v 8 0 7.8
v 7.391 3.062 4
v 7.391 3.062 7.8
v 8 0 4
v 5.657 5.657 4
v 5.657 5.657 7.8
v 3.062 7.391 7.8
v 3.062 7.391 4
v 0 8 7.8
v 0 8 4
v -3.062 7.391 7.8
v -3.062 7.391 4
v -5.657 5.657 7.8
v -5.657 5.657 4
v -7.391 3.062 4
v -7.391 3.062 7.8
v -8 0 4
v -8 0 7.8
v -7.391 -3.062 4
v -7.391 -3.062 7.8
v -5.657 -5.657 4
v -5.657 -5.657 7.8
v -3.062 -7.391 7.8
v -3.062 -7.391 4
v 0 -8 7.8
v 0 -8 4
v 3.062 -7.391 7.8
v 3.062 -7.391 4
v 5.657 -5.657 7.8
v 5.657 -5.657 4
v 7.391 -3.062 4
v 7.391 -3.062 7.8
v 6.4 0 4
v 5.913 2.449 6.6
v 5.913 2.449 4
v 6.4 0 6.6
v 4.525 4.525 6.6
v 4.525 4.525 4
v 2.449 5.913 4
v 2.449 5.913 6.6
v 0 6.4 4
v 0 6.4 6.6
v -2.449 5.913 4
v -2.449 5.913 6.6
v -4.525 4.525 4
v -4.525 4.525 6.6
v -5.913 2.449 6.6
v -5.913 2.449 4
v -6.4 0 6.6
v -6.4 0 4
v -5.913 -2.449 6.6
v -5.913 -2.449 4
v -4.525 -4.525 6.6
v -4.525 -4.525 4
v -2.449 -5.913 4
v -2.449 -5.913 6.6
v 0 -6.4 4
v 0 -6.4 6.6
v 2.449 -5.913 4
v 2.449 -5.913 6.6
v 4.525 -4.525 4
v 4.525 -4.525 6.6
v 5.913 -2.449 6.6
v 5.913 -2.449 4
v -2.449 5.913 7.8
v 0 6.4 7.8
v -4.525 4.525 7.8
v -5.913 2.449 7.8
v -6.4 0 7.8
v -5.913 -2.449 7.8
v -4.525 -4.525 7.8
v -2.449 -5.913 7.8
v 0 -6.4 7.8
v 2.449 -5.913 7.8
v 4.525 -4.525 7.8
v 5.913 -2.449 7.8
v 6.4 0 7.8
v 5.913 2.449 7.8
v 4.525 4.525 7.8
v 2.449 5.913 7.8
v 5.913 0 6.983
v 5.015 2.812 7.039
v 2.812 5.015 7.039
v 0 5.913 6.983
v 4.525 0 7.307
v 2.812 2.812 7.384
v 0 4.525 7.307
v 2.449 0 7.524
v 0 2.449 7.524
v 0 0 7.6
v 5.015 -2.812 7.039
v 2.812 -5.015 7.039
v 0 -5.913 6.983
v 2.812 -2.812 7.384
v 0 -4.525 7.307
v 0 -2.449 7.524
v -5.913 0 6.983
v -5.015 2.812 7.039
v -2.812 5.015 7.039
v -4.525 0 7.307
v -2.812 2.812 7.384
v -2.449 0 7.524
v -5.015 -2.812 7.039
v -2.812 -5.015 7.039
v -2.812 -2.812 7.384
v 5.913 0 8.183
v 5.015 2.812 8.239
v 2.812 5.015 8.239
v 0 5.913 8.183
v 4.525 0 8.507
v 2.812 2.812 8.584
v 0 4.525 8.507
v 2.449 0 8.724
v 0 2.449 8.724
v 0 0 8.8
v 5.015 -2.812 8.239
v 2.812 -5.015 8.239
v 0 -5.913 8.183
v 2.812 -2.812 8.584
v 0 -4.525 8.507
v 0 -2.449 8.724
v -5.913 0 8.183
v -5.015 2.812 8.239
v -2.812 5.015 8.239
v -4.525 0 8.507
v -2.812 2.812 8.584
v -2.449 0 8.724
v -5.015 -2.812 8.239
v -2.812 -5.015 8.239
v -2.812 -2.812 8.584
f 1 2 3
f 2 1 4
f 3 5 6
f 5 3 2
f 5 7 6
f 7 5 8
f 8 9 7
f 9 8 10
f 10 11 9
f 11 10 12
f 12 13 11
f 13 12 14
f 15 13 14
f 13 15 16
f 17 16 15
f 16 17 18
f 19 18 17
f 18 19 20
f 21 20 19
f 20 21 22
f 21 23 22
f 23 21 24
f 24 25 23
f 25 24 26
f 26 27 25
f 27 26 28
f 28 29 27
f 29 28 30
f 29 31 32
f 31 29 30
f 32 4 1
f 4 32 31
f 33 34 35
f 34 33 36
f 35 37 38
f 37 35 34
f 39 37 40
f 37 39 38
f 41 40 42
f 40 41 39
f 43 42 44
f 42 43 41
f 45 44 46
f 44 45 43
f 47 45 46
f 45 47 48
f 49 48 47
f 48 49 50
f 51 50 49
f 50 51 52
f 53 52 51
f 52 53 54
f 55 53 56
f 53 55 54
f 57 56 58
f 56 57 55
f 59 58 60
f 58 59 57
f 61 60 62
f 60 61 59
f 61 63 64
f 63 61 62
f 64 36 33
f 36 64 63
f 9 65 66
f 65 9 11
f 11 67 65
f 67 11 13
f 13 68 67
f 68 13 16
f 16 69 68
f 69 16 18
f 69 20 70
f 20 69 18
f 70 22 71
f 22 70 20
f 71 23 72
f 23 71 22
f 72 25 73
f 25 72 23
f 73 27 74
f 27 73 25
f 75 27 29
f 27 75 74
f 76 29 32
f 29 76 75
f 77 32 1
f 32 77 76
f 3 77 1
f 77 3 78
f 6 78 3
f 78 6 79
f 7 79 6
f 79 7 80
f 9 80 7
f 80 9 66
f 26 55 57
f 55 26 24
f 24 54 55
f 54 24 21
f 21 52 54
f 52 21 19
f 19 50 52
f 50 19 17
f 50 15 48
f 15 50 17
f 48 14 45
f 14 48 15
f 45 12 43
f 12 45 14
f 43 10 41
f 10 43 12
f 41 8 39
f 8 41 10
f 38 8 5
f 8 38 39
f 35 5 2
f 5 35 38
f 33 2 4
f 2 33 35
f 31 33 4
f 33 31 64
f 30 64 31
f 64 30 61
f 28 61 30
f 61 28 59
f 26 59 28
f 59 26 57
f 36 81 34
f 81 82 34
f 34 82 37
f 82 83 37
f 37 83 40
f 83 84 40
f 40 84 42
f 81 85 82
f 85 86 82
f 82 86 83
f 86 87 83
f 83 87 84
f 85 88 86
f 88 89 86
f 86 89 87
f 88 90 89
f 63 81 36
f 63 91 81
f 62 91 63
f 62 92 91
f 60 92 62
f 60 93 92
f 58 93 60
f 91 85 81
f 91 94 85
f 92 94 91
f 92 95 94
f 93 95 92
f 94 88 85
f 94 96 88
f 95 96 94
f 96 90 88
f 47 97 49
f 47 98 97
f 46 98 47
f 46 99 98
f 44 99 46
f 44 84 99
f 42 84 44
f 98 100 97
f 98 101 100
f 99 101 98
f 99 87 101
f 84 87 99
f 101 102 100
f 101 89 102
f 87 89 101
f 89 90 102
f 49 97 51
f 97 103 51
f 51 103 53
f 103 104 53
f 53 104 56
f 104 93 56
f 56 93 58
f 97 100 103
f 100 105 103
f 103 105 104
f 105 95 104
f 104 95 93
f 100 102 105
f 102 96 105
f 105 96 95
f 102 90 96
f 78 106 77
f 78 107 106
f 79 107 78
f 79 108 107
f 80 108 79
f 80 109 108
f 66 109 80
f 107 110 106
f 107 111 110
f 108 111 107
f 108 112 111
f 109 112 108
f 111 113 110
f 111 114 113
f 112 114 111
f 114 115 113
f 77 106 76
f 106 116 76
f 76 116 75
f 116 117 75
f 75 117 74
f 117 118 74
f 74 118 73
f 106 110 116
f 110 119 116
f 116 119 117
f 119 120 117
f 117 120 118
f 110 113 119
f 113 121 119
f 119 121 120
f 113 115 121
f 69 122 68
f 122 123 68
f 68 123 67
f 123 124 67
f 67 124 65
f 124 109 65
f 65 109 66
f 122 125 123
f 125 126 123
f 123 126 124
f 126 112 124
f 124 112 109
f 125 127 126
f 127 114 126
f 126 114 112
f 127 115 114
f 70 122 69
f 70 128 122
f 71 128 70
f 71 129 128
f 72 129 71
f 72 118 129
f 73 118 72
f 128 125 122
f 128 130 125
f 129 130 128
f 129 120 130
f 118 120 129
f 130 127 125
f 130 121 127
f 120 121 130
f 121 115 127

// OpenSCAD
// file: ../p/1-8sphe.scad
use <../lib.scad>
function ldraw_lib__1_8sphe() = [
// 0 Sphere 0.125
// 0 Name: 1-8sphe.dat
// 0 Author: James Jessiman
// 0 !LDRAW_ORG Primitive UPDATE 2012-03
// 0 !LICENSE Licensed under CC BY 2.0 and CC BY 4.0 : see CAreadme.txt
// 
// 0 BFC CERTIFY CCW
  [0,"BFC","CERTIFY"],
  [0,"BFC","CCW"],
// 
// 0 !HISTORY 2000-08-01 {Axel Poque} fixes to resolve L3P error messages.
// 0 !HISTORY 2000-08-01 {Manfred Moolhuysen} fixes to resolve L3P error messages.
// 0 !HISTORY 2000-09-30 [PTadmin] Official Update 2000-02
// 0 !HISTORY 2002-03-28 [hafhead] Made BFC compliant
// 0 !HISTORY 2002-04-25 [PTadmin] Official Update 2002-02
// 0 !HISTORY 2007-06-22 [PTadmin] Header formatted for Contributor Agreement
// 0 !HISTORY 2008-07-01 [PTadmin] Official Update 2008-01
// 0 !HISTORY 2010-09-12 [MagFors] Changed winding, removed duplicated cond-line, optimized filesize
// 0 !HISTORY 2010-12-31 [PTadmin] Official Update 2010-03
// 0 !HISTORY 2012-07-01 [tcobbs] Replaced with geometry from LDView
// 0 !HISTORY 2012-12-28 [PTadmin] Official Update 2012-03
// 
// 
// 3 16 1 0 0 0.9239 0.3827 0 0.9239 0 0.3827
  [3,16,1,0,0,0.9239,0.3827,0,0.9239,0,0.3827],
// 3 16 0.9239 0.3827 0 0.7836 0.4393 0.4393 0.9239 0 0.3827
  [3,16,0.9239,0.3827,0,0.7836,0.4393,0.4393,0.9239,0,0.3827],
// 3 16 0.9239 0 0.3827 0.7836 0.4393 0.4393 0.7071 0 0.7071
  [3,16,0.9239,0,0.3827,0.7836,0.4393,0.4393,0.7071,0,0.7071],
// 3 16 0.7836 0.4393 0.4393 0.4393 0.4393 0.7836 0.7071 0 0.7071
  [3,16,0.7836,0.4393,0.4393,0.4393,0.4393,0.7836,0.7071,0,0.7071],
// 3 16 0.7071 0 0.7071 0.4393 0.4393 0.7836 0.3827 0 0.9239
  [3,16,0.7071,0,0.7071,0.4393,0.4393,0.7836,0.3827,0,0.9239],
// 3 16 0.4393 0.4393 0.7836 0 0.3827 0.9239 0.3827 0 0.9239
  [3,16,0.4393,0.4393,0.7836,0,0.3827,0.9239,0.3827,0,0.9239],
// 3 16 0.3827 0 0.9239 0 0.3827 0.9239 0 0 1
  [3,16,0.3827,0,0.9239,0,0.3827,0.9239,0,0,1],
// 3 16 0.9239 0.3827 0 0.7071 0.7071 0 0.7836 0.4393 0.4393
  [3,16,0.9239,0.3827,0,0.7071,0.7071,0,0.7836,0.4393,0.4393],
// 3 16 0.7071 0.7071 0 0.4393 0.7836 0.4393 0.7836 0.4393 0.4393
  [3,16,0.7071,0.7071,0,0.4393,0.7836,0.4393,0.7836,0.4393,0.4393],
// 3 16 0.7836 0.4393 0.4393 0.4393 0.7836 0.4393 0.4393 0.4393 0.7836
  [3,16,0.7836,0.4393,0.4393,0.4393,0.7836,0.4393,0.4393,0.4393,0.7836],
// 3 16 0.4393 0.7836 0.4393 0 0.7071 0.7071 0.4393 0.4393 0.7836
  [3,16,0.4393,0.7836,0.4393,0,0.7071,0.7071,0.4393,0.4393,0.7836],
// 3 16 0.4393 0.4393 0.7836 0 0.7071 0.7071 0 0.3827 0.9239
  [3,16,0.4393,0.4393,0.7836,0,0.7071,0.7071,0,0.3827,0.9239],
// 3 16 0.7071 0.7071 0 0.3827 0.9239 0 0.4393 0.7836 0.4393
  [3,16,0.7071,0.7071,0,0.3827,0.9239,0,0.4393,0.7836,0.4393],
// 3 16 0.3827 0.9239 0 0 0.9239 0.3827 0.4393 0.7836 0.4393
  [3,16,0.3827,0.9239,0,0,0.9239,0.3827,0.4393,0.7836,0.4393],
// 3 16 0.4393 0.7836 0.4393 0 0.9239 0.3827 0 0.7071 0.7071
  [3,16,0.4393,0.7836,0.4393,0,0.9239,0.3827,0,0.7071,0.7071],
// 3 16 0.3827 0.9239 0 0 1 0 0 0.9239 0.3827
  [3,16,0.3827,0.9239,0,0,1,0,0,0.9239,0.3827],
// 
// 5 24 1 0 0 0.9239 0.3827 0 1 0 -0.1 0.9239 0 0.3827
  [5,24,1,0,0,0.9239,0.3827,0,1,0,-0.1,0.9239,0,0.3827],
// 5 24 0.9239 0.3827 0 0.9239 0 0.3827 1 0 0 0.7836 0.4393 0.4393
  [5,24,0.9239,0.3827,0,0.9239,0,0.3827,1,0,0,0.7836,0.4393,0.4393],
// 5 24 1 0 0 0.9239 0 0.3827 0.9239 0.3827 0 1 -0.1 0
  [5,24,1,0,0,0.9239,0,0.3827,0.9239,0.3827,0,1,-0.1,0],
// 5 24 0.9239 0 0.3827 0.7836 0.4393 0.4393 0.9239 0.3827 0 0.7071 0 0.7071
  [5,24,0.9239,0,0.3827,0.7836,0.4393,0.4393,0.9239,0.3827,0,0.7071,0,0.7071],
// 5 24 0.7836 0.4393 0.4393 0.7071 0 0.7071 0.9239 0 0.3827 0.4393 0.4393 0.7836
  [5,24,0.7836,0.4393,0.4393,0.7071,0,0.7071,0.9239,0,0.3827,0.4393,0.4393,0.7836],
// 5 24 0.9239 0 0.3827 0.7071 0 0.7071 0.7836 0.4393 0.4393 0.9239 -0.1 0.3827
  [5,24,0.9239,0,0.3827,0.7071,0,0.7071,0.7836,0.4393,0.4393,0.9239,-0.1,0.3827],
// 5 24 0.7071 0 0.7071 0.4393 0.4393 0.7836 0.7836 0.4393 0.4393 0.3827 0 0.9239
  [5,24,0.7071,0,0.7071,0.4393,0.4393,0.7836,0.7836,0.4393,0.4393,0.3827,0,0.9239],
// 5 24 0.4393 0.4393 0.7836 0.3827 0 0.9239 0.7071 0 0.7071 0 0.3827 0.9239
  [5,24,0.4393,0.4393,0.7836,0.3827,0,0.9239,0.7071,0,0.7071,0,0.3827,0.9239],
// 5 24 0.7071 0 0.7071 0.3827 0 0.9239 0.4393 0.4393 0.7836 0.7071 -0.1 0.7071
  [5,24,0.7071,0,0.7071,0.3827,0,0.9239,0.4393,0.4393,0.7836,0.7071,-0.1,0.7071],
// 5 24 0.3827 0 0.9239 0 0.3827 0.9239 0.4393 0.4393 0.7836 0 0 1
  [5,24,0.3827,0,0.9239,0,0.3827,0.9239,0.4393,0.4393,0.7836,0,0,1],
// 5 24 0 0.3827 0.9239 0 0 1 0.3827 0 0.9239 -0.1 0.3827 0.9239
  [5,24,0,0.3827,0.9239,0,0,1,0.3827,0,0.9239,-0.1,0.3827,0.9239],
// 5 24 0.3827 0 0.9239 0 0 1 0 0.3827 0.9239 0.3827 -0.1 0.9239
  [5,24,0.3827,0,0.9239,0,0,1,0,0.3827,0.9239,0.3827,-0.1,0.9239],
// 5 24 0.9239 0.3827 0 0.7071 0.7071 0 0.9239 0.3827 -0.1 0.7836 0.4393 0.4393
  [5,24,0.9239,0.3827,0,0.7071,0.7071,0,0.9239,0.3827,-0.1,0.7836,0.4393,0.4393],
// 5 24 0.7071 0.7071 0 0.7836 0.4393 0.4393 0.9239 0.3827 0 0.4393 0.7836 0.4393
  [5,24,0.7071,0.7071,0,0.7836,0.4393,0.4393,0.9239,0.3827,0,0.4393,0.7836,0.4393],
// 5 24 0.9239 0.3827 0 0.7836 0.4393 0.4393 0.7071 0.7071 0 0.9239 0 0.3827
  [5,24,0.9239,0.3827,0,0.7836,0.4393,0.4393,0.7071,0.7071,0,0.9239,0,0.3827],
// 5 24 0.7836 0.4393 0.4393 0.4393 0.7836 0.4393 0.7071 0.7071 0 0.4393 0.4393 0.7836
  [5,24,0.7836,0.4393,0.4393,0.4393,0.7836,0.4393,0.7071,0.7071,0,0.4393,0.4393,0.7836],
// 5 24 0.4393 0.7836 0.4393 0.4393 0.4393 0.7836 0.7836 0.4393 0.4393 0 0.7071 0.7071
  [5,24,0.4393,0.7836,0.4393,0.4393,0.4393,0.7836,0.7836,0.4393,0.4393,0,0.7071,0.7071],
// 5 24 0.7836 0.4393 0.4393 0.4393 0.4393 0.7836 0.4393 0.7836 0.4393 0.7071 0 0.7071
  [5,24,0.7836,0.4393,0.4393,0.4393,0.4393,0.7836,0.4393,0.7836,0.4393,0.7071,0,0.7071],
// 5 24 0.4393 0.4393 0.7836 0 0.7071 0.7071 0.4393 0.7836 0.4393 0 0.3827 0.9239
  [5,24,0.4393,0.4393,0.7836,0,0.7071,0.7071,0.4393,0.7836,0.4393,0,0.3827,0.9239],
// 5 24 0 0.7071 0.7071 0 0.3827 0.9239 0.4393 0.4393 0.7836 -0.1 0.7071 0.7071
  [5,24,0,0.7071,0.7071,0,0.3827,0.9239,0.4393,0.4393,0.7836,-0.1,0.7071,0.7071],
// 5 24 0.4393 0.4393 0.7836 0 0.3827 0.9239 0 0.7071 0.7071 0.3827 0 0.9239
  [5,24,0.4393,0.4393,0.7836,0,0.3827,0.9239,0,0.7071,0.7071,0.3827,0,0.9239],
// 5 24 0.7071 0.7071 0 0.3827 0.9239 0 0.7071 0.7071 -0.1 0.4393 0.7836 0.4393
  [5,24,0.7071,0.7071,0,0.3827,0.9239,0,0.7071,0.7071,-0.1,0.4393,0.7836,0.4393],
// 5 24 0.3827 0.9239 0 0.4393 0.7836 0.4393 0.7071 0.7071 0 0 0.9239 0.3827
  [5,24,0.3827,0.9239,0,0.4393,0.7836,0.4393,0.7071,0.7071,0,0,0.9239,0.3827],
// 5 24 0.7071 0.7071 0 0.4393 0.7836 0.4393 0.3827 0.9239 0 0.7836 0.4393 0.4393
  [5,24,0.7071,0.7071,0,0.4393,0.7836,0.4393,0.3827,0.9239,0,0.7836,0.4393,0.4393],
// 5 24 0.4393 0.7836 0.4393 0 0.9239 0.3827 0.3827 0.9239 0 0 0.7071 0.7071
  [5,24,0.4393,0.7836,0.4393,0,0.9239,0.3827,0.3827,0.9239,0,0,0.7071,0.7071],
// 5 24 0 0.9239 0.3827 0 0.7071 0.7071 0.4393 0.7836 0.4393 -0.1 0.9239 0.3827
  [5,24,0,0.9239,0.3827,0,0.7071,0.7071,0.4393,0.7836,0.4393,-0.1,0.9239,0.3827],
// 5 24 0.4393 0.7836 0.4393 0 0.7071 0.7071 0 0.9239 0.3827 0.4393 0.4393 0.7836
  [5,24,0.4393,0.7836,0.4393,0,0.7071,0.7071,0,0.9239,0.3827,0.4393,0.4393,0.7836],
// 5 24 0.3827 0.9239 0 0 1 0 0.3827 0.9239 -0.1 0 0.9239 0.3827
  [5,24,0.3827,0.9239,0,0,1,0,0.3827,0.9239,-0.1,0,0.9239,0.3827],
// 5 24 0 1 0 0 0.9239 0.3827 0.3827 0.9239 0 -0.1 1 0
  [5,24,0,1,0,0,0.9239,0.3827,0.3827,0.9239,0,-0.1,1,0],
// 5 24 0.3827 0.9239 0 0 0.9239 0.3827 0 1 0 0.4393 0.7836 0.4393
  [5,24,0.3827,0.9239,0,0,0.9239,0.3827,0,1,0,0.4393,0.7836,0.4393],
];
module ldraw_lib__1_8sphe(step=0, col=false, unit=2/5, alt=false, line=0.2, solid=!$preview)
    makepoly(ldraw_lib__1_8sphe(), step=step, col=col, unit=unit, alt=alt, line=line, solid=solid);
ldraw_lib__1_8sphe(line=0.2);
// file: ../p/4-4cyli.scad
use <../lib.scad>
function ldraw_lib__4_4cyli() = [
// 0 Cylinder 1.0
// 0 Name: 4-4cyli.dat
// 0 Author: James Jessiman
// 0 !LDRAW_ORG Primitive UPDATE 2005-01
// 0 !LICENSE Licensed under CC BY 2.0 and CC BY 4.0 : see CAreadme.txt
// 
// 0 BFC CERTIFY CCW
  [0,"BFC","CERTIFY"],
  [0,"BFC","CCW"],
// 
// 0 !HISTORY 1998-12-15 [PTadmin] Official Update 1998-10
// 0 !HISTORY 2002-03-23 [sbliss] Added BFC statement; merged headers from files in distributions LDraw 0.27 and Complete.
// 0 !HISTORY 2002-04-25 [PTadmin] Official Update 2002-02
// 0 !HISTORY 2004-12-14 [guyvivan] BFC CCW
// 0 !HISTORY 2005-12-28 [PTadmin] Official Update 2005-01
// 0 !HISTORY 2007-06-24 [PTadmin] Header formatted for Contributor Agreement
// 0 !HISTORY 2008-07-01 [PTadmin] Official Update 2008-01
// 
// 
// 4 16 1 1 0 0.9239 1 0.3827 0.9239 0 0.3827 1 0 0
  [4,16,1,1,0,0.9239,1,0.3827,0.9239,0,0.3827,1,0,0],
// 5 24 1 0 0 1 1 0 0.9239 0 0.3827 0.9239 0 -0.3827
  [5,24,1,0,0,1,1,0,0.9239,0,0.3827,0.9239,0,-0.3827],
// 4 16 0.9239 1 0.3827 0.7071 1 0.7071 0.7071 0 0.7071 0.9239 0 0.3827
  [4,16,0.9239,1,0.3827,0.7071,1,0.7071,0.7071,0,0.7071,0.9239,0,0.3827],
// 5 24 0.9239 0 0.3827 0.9239 1 0.3827 0.7071 0 0.7071 1 0 0
  [5,24,0.9239,0,0.3827,0.9239,1,0.3827,0.7071,0,0.7071,1,0,0],
// 4 16 0.7071 1 0.7071 0.3827 1 0.9239 0.3827 0 0.9239 0.7071 0 0.7071
  [4,16,0.7071,1,0.7071,0.3827,1,0.9239,0.3827,0,0.9239,0.7071,0,0.7071],
// 5 24 0.7071 0 0.7071 0.7071 1 0.7071 0.3827 0 0.9239 0.9239 0 0.3827
  [5,24,0.7071,0,0.7071,0.7071,1,0.7071,0.3827,0,0.9239,0.9239,0,0.3827],
// 4 16 0.3827 1 0.9239 0 1 1 0 0 1 0.3827 0 0.9239
  [4,16,0.3827,1,0.9239,0,1,1,0,0,1,0.3827,0,0.9239],
// 5 24 0.3827 0 0.9239 0.3827 1 0.9239 0 0 1 0.7071 0 0.7071
  [5,24,0.3827,0,0.9239,0.3827,1,0.9239,0,0,1,0.7071,0,0.7071],
// 4 16 0 1 1 -0.3827 1 0.9239 -0.3827 0 0.9239 0 0 1
  [4,16,0,1,1,-0.3827,1,0.9239,-0.3827,0,0.9239,0,0,1],
// 5 24 0 0 1 0 1 1 -0.3827 0 0.9239 0.3827 0 0.9239
  [5,24,0,0,1,0,1,1,-0.3827,0,0.9239,0.3827,0,0.9239],
// 4 16 -0.3827 1 0.9239 -0.7071 1 0.7071 -0.7071 0 0.7071 -0.3827 0 0.9239
  [4,16,-0.3827,1,0.9239,-0.7071,1,0.7071,-0.7071,0,0.7071,-0.3827,0,0.9239],
// 5 24 -0.3827 0 0.9239 -0.3827 1 0.9239 -0.7071 0 0.7071 0 0 1
  [5,24,-0.3827,0,0.9239,-0.3827,1,0.9239,-0.7071,0,0.7071,0,0,1],
// 4 16 -0.7071 1 0.7071 -0.9239 1 0.3827 -0.9239 0 0.3827 -0.7071 0 0.7071
  [4,16,-0.7071,1,0.7071,-0.9239,1,0.3827,-0.9239,0,0.3827,-0.7071,0,0.7071],
// 5 24 -0.7071 0 0.7071 -0.7071 1 0.7071 -0.9239 0 0.3827 -0.3827 0 0.9239
  [5,24,-0.7071,0,0.7071,-0.7071,1,0.7071,-0.9239,0,0.3827,-0.3827,0,0.9239],
// 4 16 -0.9239 1 0.3827 -1 1 0 -1 0 0 -0.9239 0 0.3827
  [4,16,-0.9239,1,0.3827,-1,1,0,-1,0,0,-0.9239,0,0.3827],
// 5 24 -0.9239 0 0.3827 -0.9239 1 0.3827 -1 0 0 -0.7071 0 0.7071
  [5,24,-0.9239,0,0.3827,-0.9239,1,0.3827,-1,0,0,-0.7071,0,0.7071],
// 4 16 -1 1 0 -0.9239 1 -0.3827 -0.9239 0 -0.3827 -1 0 0
  [4,16,-1,1,0,-0.9239,1,-0.3827,-0.9239,0,-0.3827,-1,0,0],
// 5 24 -1 0 0 -1 1 0 -0.9239 0 -0.3827 -0.9239 0 0.3827
  [5,24,-1,0,0,-1,1,0,-0.9239,0,-0.3827,-0.9239,0,0.3827],
// 4 16 -0.9239 1 -0.3827 -0.7071 1 -0.7071 -0.7071 0 -0.7071 -0.9239 0 -0.3827
  [4,16,-0.9239,1,-0.3827,-0.7071,1,-0.7071,-0.7071,0,-0.7071,-0.9239,0,-0.3827],
// 5 24 -0.9239 0 -0.3827 -0.9239 1 -0.3827 -0.7071 0 -0.7071 -1 0 0
  [5,24,-0.9239,0,-0.3827,-0.9239,1,-0.3827,-0.7071,0,-0.7071,-1,0,0],
// 4 16 -0.7071 1 -0.7071 -0.3827 1 -0.9239 -0.3827 0 -0.9239 -0.7071 0 -0.7071
  [4,16,-0.7071,1,-0.7071,-0.3827,1,-0.9239,-0.3827,0,-0.9239,-0.7071,0,-0.7071],
// 5 24 -0.7071 0 -0.7071 -0.7071 1 -0.7071 -0.3827 0 -0.9239 -0.9239 0 -0.3827
  [5,24,-0.7071,0,-0.7071,-0.7071,1,-0.7071,-0.3827,0,-0.9239,-0.9239,0,-0.3827],
// 4 16 -0.3827 1 -0.9239 0 1 -1 0 0 -1 -0.3827 0 -0.9239
  [4,16,-0.3827,1,-0.9239,0,1,-1,0,0,-1,-0.3827,0,-0.9239],
// 5 24 -0.3827 0 -0.9239 -0.3827 1 -0.9239 0 0 -1 -0.7071 0 -0.7071
  [5,24,-0.3827,0,-0.9239,-0.3827,1,-0.9239,0,0,-1,-0.7071,0,-0.7071],
// 4 16 0 1 -1 0.3827 1 -0.9239 0.3827 0 -0.9239 0 0 -1
  [4,16,0,1,-1,0.3827,1,-0.9239,0.3827,0,-0.9239,0,0,-1],
// 5 24 0 0 -1 0 1 -1 0.3827 0 -0.9239 -0.3827 0 -0.9239
  [5,24,0,0,-1,0,1,-1,0.3827,0,-0.9239,-0.3827,0,-0.9239],
// 4 16 0.3827 1 -0.9239 0.7071 1 -0.7071 0.7071 0 -0.7071 0.3827 0 -0.9239
  [4,16,0.3827,1,-0.9239,0.7071,1,-0.7071,0.7071,0,-0.7071,0.3827,0,-0.9239],
// 5 24 0.3827 0 -0.9239 0.3827 1 -0.9239 0.7071 0 -0.7071 0 0 -1
  [5,24,0.3827,0,-0.9239,0.3827,1,-0.9239,0.7071,0,-0.7071,0,0,-1],
// 4 16 0.7071 1 -0.7071 0.9239 1 -0.3827 0.9239 0 -0.3827 0.7071 0 -0.7071
  [4,16,0.7071,1,-0.7071,0.9239,1,-0.3827,0.9239,0,-0.3827,0.7071,0,-0.7071],
// 5 24 0.7071 0 -0.7071 0.7071 1 -0.7071 0.9239 0 -0.3827 0.3827 0 -0.9239
  [5,24,0.7071,0,-0.7071,0.7071,1,-0.7071,0.9239,0,-0.3827,0.3827,0,-0.9239],
// 4 16 0.9239 1 -0.3827 1 1 0 1 0 0 0.9239 0 -0.3827
  [4,16,0.9239,1,-0.3827,1,1,0,1,0,0,0.9239,0,-0.3827],
// 5 24 0.9239 0 -0.3827 0.9239 1 -0.3827 1 0 0 0.7071 0 -0.7071
  [5,24,0.9239,0,-0.3827,0.9239,1,-0.3827,1,0,0,0.7071,0,-0.7071],
// 0
];
module ldraw_lib__4_4cyli(step=0, col=false, unit=2/5, alt=false, line=0.2, solid=!$preview)
    makepoly(ldraw_lib__4_4cyli(), step=step, col=col, unit=unit, alt=alt, line=line, solid=solid);
ldraw_lib__4_4cyli(line=0.2);
// file: ../p/4-8sphe.scad
use <../lib.scad>
use <1-8sphe.scad>
function ldraw_lib__4_8sphe() = [
// 0 Sphere 0.5
// 0 Name: 4-8sphe.dat
// 0 Author: James Jessiman
// 0 !LDRAW_ORG Primitive UPDATE 2003-02
// 0 !LICENSE Licensed under CC BY 2.0 and CC BY 4.0 : see CAreadme.txt
// 
// 0 BFC CERTIFY CCW
  [0,"BFC","CERTIFY"],
  [0,"BFC","CCW"],
// 
// 0 !HISTORY 2002-08-31 [izanette] Modified with WINDZ for BFC compliance
// 0 !HISTORY 2003-08-01 [PTadmin] Official Update 2003-02
// 0 !HISTORY 2007-06-24 [PTadmin] Header formatted for Contributor Agreement
// 0 !HISTORY 2008-07-01 [PTadmin] Official Update 2008-01
// 
// 
// 1 16 0 0 0 1 0 0 0 1 0 0 0 1 1-8sphe.dat
  [1,16,0,0,0,1,0,0,0,1,0,0,0,1, ldraw_lib__1_8sphe()],
// 1 16 0 0 0 1 0 0 0 1 0 0 0 -1 1-8sphe.dat
  [1,16,0,0,0,1,0,0,0,1,0,0,0,-1, ldraw_lib__1_8sphe()],
// 1 16 0 0 0 -1 0 0 0 1 0 0 0 1 1-8sphe.dat
  [1,16,0,0,0,-1,0,0,0,1,0,0,0,1, ldraw_lib__1_8sphe()],
// 1 16 0 0 0 -1 0 0 0 1 0 0 0 -1 1-8sphe.dat
  [1,16,0,0,0,-1,0,0,0,1,0,0,0,-1, ldraw_lib__1_8sphe()],
// 0
// 
];
module ldraw_lib__4_8sphe(step=0, col=false, unit=2/5, alt=false, line=0.2, solid=!$preview)
    makepoly(ldraw_lib__4_8sphe(), step=step, col=col, unit=unit, alt=alt, line=line, solid=solid);
ldraw_lib__4_8sphe(line=0.2);
// file: ../p/4-4ring4.scad
use <../lib.scad>
function ldraw_lib__4_4ring4() = [
// 0 Ring  4 x 1.0
// 0 Name: 4-4ring4.dat
// 0 Author: James Jessiman
// 0 !LDRAW_ORG Primitive UPDATE 2009-01
// 0 !LICENSE Licensed under CC BY 2.0 and CC BY 4.0 : see CAreadme.txt
// 
// 0 BFC CERTIFY CCW
  [0,"BFC","CERTIFY"],
  [0,"BFC","CCW"],
// 
// 0 !HISTORY 1998-12-15 [PTadmin] Official Update 1998-10
// 0 !HISTORY 2002-04-08 [BrickCaster] Modified for BFC compliance
// 0 !HISTORY 2002-04-25 [PTadmin] Official Update 2002-02
// 0 !HISTORY 2007-06-24 [PTadmin] Header formatted for Contributor Agreement
// 0 !HISTORY 2008-07-01 [PTadmin] Official Update 2008-01
// 0 !HISTORY 2008-08-26 [cwdee] Switch polygon winding and rename
// 0 !HISTORY 2009-05-02 [PTadmin] Official Update 2009-01
// 
// 
// 4 16 -1.9135 0 4.6195 -1.5308 0 3.6956 0 0 4 0 0 5
  [4,16,-1.9135,0,4.6195,-1.5308,0,3.6956,0,0,4,0,0,5],
// 4 16 -3.5355 0 3.5355 -2.8284 0 2.8284 -1.5308 0 3.6956 -1.9135 0 4.6195
  [4,16,-3.5355,0,3.5355,-2.8284,0,2.8284,-1.5308,0,3.6956,-1.9135,0,4.6195],
// 4 16 -4.6195 0 1.9135 -3.6956 0 1.5308 -2.8284 0 2.8284 -3.5355 0 3.5355
  [4,16,-4.6195,0,1.9135,-3.6956,0,1.5308,-2.8284,0,2.8284,-3.5355,0,3.5355],
// 4 16 -5 0 0 -4 0 0 -3.6956 0 1.5308 -4.6195 0 1.9135
  [4,16,-5,0,0,-4,0,0,-3.6956,0,1.5308,-4.6195,0,1.9135],
// 4 16 -4.6195 0 -1.9135 -3.6956 0 -1.5308 -4 0 0 -5 0 0
  [4,16,-4.6195,0,-1.9135,-3.6956,0,-1.5308,-4,0,0,-5,0,0],
// 4 16 -3.5355 0 -3.5355 -2.8284 0 -2.8284 -3.6956 0 -1.5308 -4.6195 0 -1.9135
  [4,16,-3.5355,0,-3.5355,-2.8284,0,-2.8284,-3.6956,0,-1.5308,-4.6195,0,-1.9135],
// 4 16 -1.9135 0 -4.6195 -1.5308 0 -3.6956 -2.8284 0 -2.8284 -3.5355 0 -3.5355
  [4,16,-1.9135,0,-4.6195,-1.5308,0,-3.6956,-2.8284,0,-2.8284,-3.5355,0,-3.5355],
// 4 16 0 0 -5 0 0 -4 -1.5308 0 -3.6956 -1.9135 0 -4.6195
  [4,16,0,0,-5,0,0,-4,-1.5308,0,-3.6956,-1.9135,0,-4.6195],
// 4 16 1.9135 0 -4.6195 1.5308 0 -3.6956 0 0 -4 0 0 -5
  [4,16,1.9135,0,-4.6195,1.5308,0,-3.6956,0,0,-4,0,0,-5],
// 4 16 3.5355 0 -3.5355 2.8284 0 -2.8284 1.5308 0 -3.6956 1.9135 0 -4.6195
  [4,16,3.5355,0,-3.5355,2.8284,0,-2.8284,1.5308,0,-3.6956,1.9135,0,-4.6195],
// 4 16 4.6195 0 -1.9135 3.6956 0 -1.5308 2.8284 0 -2.8284 3.5355 0 -3.5355
  [4,16,4.6195,0,-1.9135,3.6956,0,-1.5308,2.8284,0,-2.8284,3.5355,0,-3.5355],
// 4 16 5 0 0 4 0 0 3.6956 0 -1.5308 4.6195 0 -1.9135
  [4,16,5,0,0,4,0,0,3.6956,0,-1.5308,4.6195,0,-1.9135],
// 4 16 4.6195 0 1.9135 3.6956 0 1.5308 4 0 0 5 0 0
  [4,16,4.6195,0,1.9135,3.6956,0,1.5308,4,0,0,5,0,0],
// 4 16 3.5355 0 3.5355 2.8284 0 2.8284 3.6956 0 1.5308 4.6195 0 1.9135
  [4,16,3.5355,0,3.5355,2.8284,0,2.8284,3.6956,0,1.5308,4.6195,0,1.9135],
// 4 16 1.9135 0 4.6195 1.5308 0 3.6956 2.8284 0 2.8284 3.5355 0 3.5355
  [4,16,1.9135,0,4.6195,1.5308,0,3.6956,2.8284,0,2.8284,3.5355,0,3.5355],
// 4 16 0 0 5 0 0 4 1.5308 0 3.6956 1.9135 0 4.6195
  [4,16,0,0,5,0,0,4,1.5308,0,3.6956,1.9135,0,4.6195],
// 0
];
module ldraw_lib__4_4ring4(step=0, col=false, unit=2/5, alt=false, line=0.2, solid=!$preview)
    makepoly(ldraw_lib__4_4ring4(), step=step, col=col, unit=unit, alt=alt, line=line, solid=solid);
ldraw_lib__4_4ring4(line=0.2);
// file: ../p/4-4edge.scad
use <../lib.scad>
function ldraw_lib__4_4edge() = [
// 0 Circle 1.0
// 0 Name: 4-4edge.dat
// 0 Author: James Jessiman
// 0 !LDRAW_ORG Primitive UPDATE 2017-01
// 0 !LICENSE Licensed under CC BY 2.0 and CC BY 4.0 : see CAreadme.txt
// 
// 0 BFC CERTIFY CCW
  [0,"BFC","CERTIFY"],
  [0,"BFC","CCW"],
// 
// 0 !HISTORY 1998-12-15 [PTadmin] Official Update 1998-10
// 0 !HISTORY 2005-12-28 [PTadmin] Official Update 2005-01
// 0 !HISTORY 2007-06-24 [PTadmin] Header formatted for Contributor Agreement
// 0 !HISTORY 2008-07-01 [PTadmin] Official Update 2008-01
// 0 !HISTORY 2017-01-15 [Steffen] BFCed
// 0 !HISTORY 2017-12-30 [PTadmin] Official Update 2017-01
// 
// 
// 2 24 1 0 0 0.9239 0 0.3827
  [2,24,1,0,0,0.9239,0,0.3827],
// 2 24 0.9239 0 0.3827 0.7071 0 0.7071
  [2,24,0.9239,0,0.3827,0.7071,0,0.7071],
// 2 24 0.7071 0 0.7071 0.3827 0 0.9239
  [2,24,0.7071,0,0.7071,0.3827,0,0.9239],
// 2 24 0.3827 0 0.9239 0 0 1
  [2,24,0.3827,0,0.9239,0,0,1],
// 2 24 0 0 1 -0.3827 0 0.9239
  [2,24,0,0,1,-0.3827,0,0.9239],
// 2 24 -0.3827 0 0.9239 -0.7071 0 0.7071
  [2,24,-0.3827,0,0.9239,-0.7071,0,0.7071],
// 2 24 -0.7071 0 0.7071 -0.9239 0 0.3827
  [2,24,-0.7071,0,0.7071,-0.9239,0,0.3827],
// 2 24 -0.9239 0 0.3827 -1 0 -0
  [2,24,-0.9239,0,0.3827,-1,0,-0],
// 2 24 -1 0 -0 -0.9239 0 -0.3827
  [2,24,-1,0,-0,-0.9239,0,-0.3827],
// 2 24 -0.9239 0 -0.3827 -0.7071 0 -0.7071
  [2,24,-0.9239,0,-0.3827,-0.7071,0,-0.7071],
// 2 24 -0.7071 0 -0.7071 -0.3827 0 -0.9239
  [2,24,-0.7071,0,-0.7071,-0.3827,0,-0.9239],
// 2 24 -0.3827 0 -0.9239 0 0 -1
  [2,24,-0.3827,0,-0.9239,0,0,-1],
// 2 24 0 0 -1 0.3827 0 -0.9239
  [2,24,0,0,-1,0.3827,0,-0.9239],
// 2 24 0.3827 0 -0.9239 0.7071 0 -0.7071
  [2,24,0.3827,0,-0.9239,0.7071,0,-0.7071],
// 2 24 0.7071 0 -0.7071 0.9239 0 -0.3827
  [2,24,0.7071,0,-0.7071,0.9239,0,-0.3827],
// 2 24 0.9239 0 -0.3827 1 0 0
  [2,24,0.9239,0,-0.3827,1,0,0],
];
module ldraw_lib__4_4edge(step=0, col=false, unit=2/5, alt=false, line=0.2, solid=!$preview)
    makepoly(ldraw_lib__4_4edge(), step=step, col=col, unit=unit, alt=alt, line=line, solid=solid);
ldraw_lib__4_4edge(line=0.2);
// file: ../p/4-4cylo.scad
use <../lib.scad>
use <4-4cyli.scad>
use <4-4edge.scad>
function ldraw_lib__4_4cylo() = [
// 0 Cylinder Open 1.0
// 0 Name: 4-4cylo.dat
// 0 Author: Mark Kennedy [mkennedy]
// 0 !LDRAW_ORG Primitive UPDATE 2010-01
// 0 !LICENSE Licensed under CC BY 2.0 and CC BY 4.0 : see CAreadme.txt
// 
// 0 BFC CERTIFY CCW
  [0,"BFC","CERTIFY"],
  [0,"BFC","CCW"],
// 
// 0 !HISTORY 2010-04-05 [PTadmin] Official Update 2010-01
// 
// 
// 1 16 0 0 0 1 0 0 0 1 0 0 0 1 4-4edge.dat
  [1,16,0,0,0,1,0,0,0,1,0,0,0,1, ldraw_lib__4_4edge()],
// 1 16 0 1 0 1 0 0 0 1 0 0 0 1 4-4edge.dat
  [1,16,0,1,0,1,0,0,0,1,0,0,0,1, ldraw_lib__4_4edge()],
// 1 16 0 0 0 1 0 0 0 1 0 0 0 1 4-4cyli.dat
  [1,16,0,0,0,1,0,0,0,1,0,0,0,1, ldraw_lib__4_4cyli()],
// 0
];
module ldraw_lib__4_4cylo(step=0, col=false, unit=2/5, alt=false, line=0.2, solid=!$preview)
    makepoly(ldraw_lib__4_4cylo(), step=step, col=col, unit=unit, alt=alt, line=line, solid=solid);
ldraw_lib__4_4cylo(line=0.2);
// main file
use <../lib.scad>
use <../p/4-4cylo.scad>
use <../p/4-4edge.scad>
use <../p/4-4ring4.scad>
use <../p/4-8sphe.scad>
function ldraw_lib__6095() = [
// 0 ~Minifig Compass Cover
// 0 Name: 6095.dat
// 0 Author: Michael Heidemann [mikeheide]
// 0 !LDRAW_ORG Part UPDATE 2020-01
// 0 !LICENSE Licensed under CC BY 2.0 and CC BY 4.0 : see CAreadme.txt
// 
// 0 BFC CERTIFY CCW
  [0,"BFC","CERTIFY"],
  [0,"BFC","CCW"],
// 
// 0 !HISTORY 2009-12-29 [PTadmin] Official Update 2009-03
// 0 !HISTORY 2018-06-02 [MagFors] Renamed from 888
// 0 !HISTORY 2020-06-28 [PTadmin] Official Update 2020-01
// 
// 
// 1 16 0 -10 0 20 0 0 0 -9.5 0 0 0 20 4-4cylo.dat
  [1,16,0,-10,0,20,0,0,0,-9.5,0,0,0,20, ldraw_lib__4_4cylo()],
// 0 BFC INVERTNEXT
  [0,"BFC","INVERTNEXT"],
// 1 16 0 -10 0 16 0 0 0 -6.5 0 0 0 16 4-4cylo.dat
  [1,16,0,-10,0,16,0,0,0,-6.5,0,0,0,16, ldraw_lib__4_4cylo()],
// 1 16 0 -19.5 0 4 0 0 0 1 0 0 0 4 4-4ring4.dat
  [1,16,0,-19.5,0,4,0,0,0,1,0,0,0,4, ldraw_lib__4_4ring4()],
// 1 16 0 -10 0 4 0 0 0 -1 0 0 0 -4 4-4ring4.dat
  [1,16,0,-10,0,4,0,0,0,-1,0,0,0,-4, ldraw_lib__4_4ring4()],
// 0 BFC INVERTNEXT
  [0,"BFC","INVERTNEXT"],
// 1 16 0 -16.5 0 16 0 0 0 -2.5 0 0 0 16 4-8sphe.dat
  [1,16,0,-16.5,0,16,0,0,0,-2.5,0,0,0,16, ldraw_lib__4_8sphe()],
// 1 16 0 -19.5 0 16 0 0 0 1 0 0 0 16 4-4edge.dat
  [1,16,0,-19.5,0,16,0,0,0,1,0,0,0,16, ldraw_lib__4_4edge()],
// 1 16 0 -19.5 0 16 0 0 0 -2.5 0 0 0 16 4-8sphe.dat
  [1,16,0,-19.5,0,16,0,0,0,-2.5,0,0,0,16, ldraw_lib__4_8sphe()],
];
module ldraw_lib__6095(step=0, col=false, unit=2/5, alt=false, line=0.2, solid=!$preview)
    makepoly(ldraw_lib__6095(), step=step, col=col, unit=unit, alt=alt, line=line, solid=solid);
ldraw_lib__6095(line=0.2);
